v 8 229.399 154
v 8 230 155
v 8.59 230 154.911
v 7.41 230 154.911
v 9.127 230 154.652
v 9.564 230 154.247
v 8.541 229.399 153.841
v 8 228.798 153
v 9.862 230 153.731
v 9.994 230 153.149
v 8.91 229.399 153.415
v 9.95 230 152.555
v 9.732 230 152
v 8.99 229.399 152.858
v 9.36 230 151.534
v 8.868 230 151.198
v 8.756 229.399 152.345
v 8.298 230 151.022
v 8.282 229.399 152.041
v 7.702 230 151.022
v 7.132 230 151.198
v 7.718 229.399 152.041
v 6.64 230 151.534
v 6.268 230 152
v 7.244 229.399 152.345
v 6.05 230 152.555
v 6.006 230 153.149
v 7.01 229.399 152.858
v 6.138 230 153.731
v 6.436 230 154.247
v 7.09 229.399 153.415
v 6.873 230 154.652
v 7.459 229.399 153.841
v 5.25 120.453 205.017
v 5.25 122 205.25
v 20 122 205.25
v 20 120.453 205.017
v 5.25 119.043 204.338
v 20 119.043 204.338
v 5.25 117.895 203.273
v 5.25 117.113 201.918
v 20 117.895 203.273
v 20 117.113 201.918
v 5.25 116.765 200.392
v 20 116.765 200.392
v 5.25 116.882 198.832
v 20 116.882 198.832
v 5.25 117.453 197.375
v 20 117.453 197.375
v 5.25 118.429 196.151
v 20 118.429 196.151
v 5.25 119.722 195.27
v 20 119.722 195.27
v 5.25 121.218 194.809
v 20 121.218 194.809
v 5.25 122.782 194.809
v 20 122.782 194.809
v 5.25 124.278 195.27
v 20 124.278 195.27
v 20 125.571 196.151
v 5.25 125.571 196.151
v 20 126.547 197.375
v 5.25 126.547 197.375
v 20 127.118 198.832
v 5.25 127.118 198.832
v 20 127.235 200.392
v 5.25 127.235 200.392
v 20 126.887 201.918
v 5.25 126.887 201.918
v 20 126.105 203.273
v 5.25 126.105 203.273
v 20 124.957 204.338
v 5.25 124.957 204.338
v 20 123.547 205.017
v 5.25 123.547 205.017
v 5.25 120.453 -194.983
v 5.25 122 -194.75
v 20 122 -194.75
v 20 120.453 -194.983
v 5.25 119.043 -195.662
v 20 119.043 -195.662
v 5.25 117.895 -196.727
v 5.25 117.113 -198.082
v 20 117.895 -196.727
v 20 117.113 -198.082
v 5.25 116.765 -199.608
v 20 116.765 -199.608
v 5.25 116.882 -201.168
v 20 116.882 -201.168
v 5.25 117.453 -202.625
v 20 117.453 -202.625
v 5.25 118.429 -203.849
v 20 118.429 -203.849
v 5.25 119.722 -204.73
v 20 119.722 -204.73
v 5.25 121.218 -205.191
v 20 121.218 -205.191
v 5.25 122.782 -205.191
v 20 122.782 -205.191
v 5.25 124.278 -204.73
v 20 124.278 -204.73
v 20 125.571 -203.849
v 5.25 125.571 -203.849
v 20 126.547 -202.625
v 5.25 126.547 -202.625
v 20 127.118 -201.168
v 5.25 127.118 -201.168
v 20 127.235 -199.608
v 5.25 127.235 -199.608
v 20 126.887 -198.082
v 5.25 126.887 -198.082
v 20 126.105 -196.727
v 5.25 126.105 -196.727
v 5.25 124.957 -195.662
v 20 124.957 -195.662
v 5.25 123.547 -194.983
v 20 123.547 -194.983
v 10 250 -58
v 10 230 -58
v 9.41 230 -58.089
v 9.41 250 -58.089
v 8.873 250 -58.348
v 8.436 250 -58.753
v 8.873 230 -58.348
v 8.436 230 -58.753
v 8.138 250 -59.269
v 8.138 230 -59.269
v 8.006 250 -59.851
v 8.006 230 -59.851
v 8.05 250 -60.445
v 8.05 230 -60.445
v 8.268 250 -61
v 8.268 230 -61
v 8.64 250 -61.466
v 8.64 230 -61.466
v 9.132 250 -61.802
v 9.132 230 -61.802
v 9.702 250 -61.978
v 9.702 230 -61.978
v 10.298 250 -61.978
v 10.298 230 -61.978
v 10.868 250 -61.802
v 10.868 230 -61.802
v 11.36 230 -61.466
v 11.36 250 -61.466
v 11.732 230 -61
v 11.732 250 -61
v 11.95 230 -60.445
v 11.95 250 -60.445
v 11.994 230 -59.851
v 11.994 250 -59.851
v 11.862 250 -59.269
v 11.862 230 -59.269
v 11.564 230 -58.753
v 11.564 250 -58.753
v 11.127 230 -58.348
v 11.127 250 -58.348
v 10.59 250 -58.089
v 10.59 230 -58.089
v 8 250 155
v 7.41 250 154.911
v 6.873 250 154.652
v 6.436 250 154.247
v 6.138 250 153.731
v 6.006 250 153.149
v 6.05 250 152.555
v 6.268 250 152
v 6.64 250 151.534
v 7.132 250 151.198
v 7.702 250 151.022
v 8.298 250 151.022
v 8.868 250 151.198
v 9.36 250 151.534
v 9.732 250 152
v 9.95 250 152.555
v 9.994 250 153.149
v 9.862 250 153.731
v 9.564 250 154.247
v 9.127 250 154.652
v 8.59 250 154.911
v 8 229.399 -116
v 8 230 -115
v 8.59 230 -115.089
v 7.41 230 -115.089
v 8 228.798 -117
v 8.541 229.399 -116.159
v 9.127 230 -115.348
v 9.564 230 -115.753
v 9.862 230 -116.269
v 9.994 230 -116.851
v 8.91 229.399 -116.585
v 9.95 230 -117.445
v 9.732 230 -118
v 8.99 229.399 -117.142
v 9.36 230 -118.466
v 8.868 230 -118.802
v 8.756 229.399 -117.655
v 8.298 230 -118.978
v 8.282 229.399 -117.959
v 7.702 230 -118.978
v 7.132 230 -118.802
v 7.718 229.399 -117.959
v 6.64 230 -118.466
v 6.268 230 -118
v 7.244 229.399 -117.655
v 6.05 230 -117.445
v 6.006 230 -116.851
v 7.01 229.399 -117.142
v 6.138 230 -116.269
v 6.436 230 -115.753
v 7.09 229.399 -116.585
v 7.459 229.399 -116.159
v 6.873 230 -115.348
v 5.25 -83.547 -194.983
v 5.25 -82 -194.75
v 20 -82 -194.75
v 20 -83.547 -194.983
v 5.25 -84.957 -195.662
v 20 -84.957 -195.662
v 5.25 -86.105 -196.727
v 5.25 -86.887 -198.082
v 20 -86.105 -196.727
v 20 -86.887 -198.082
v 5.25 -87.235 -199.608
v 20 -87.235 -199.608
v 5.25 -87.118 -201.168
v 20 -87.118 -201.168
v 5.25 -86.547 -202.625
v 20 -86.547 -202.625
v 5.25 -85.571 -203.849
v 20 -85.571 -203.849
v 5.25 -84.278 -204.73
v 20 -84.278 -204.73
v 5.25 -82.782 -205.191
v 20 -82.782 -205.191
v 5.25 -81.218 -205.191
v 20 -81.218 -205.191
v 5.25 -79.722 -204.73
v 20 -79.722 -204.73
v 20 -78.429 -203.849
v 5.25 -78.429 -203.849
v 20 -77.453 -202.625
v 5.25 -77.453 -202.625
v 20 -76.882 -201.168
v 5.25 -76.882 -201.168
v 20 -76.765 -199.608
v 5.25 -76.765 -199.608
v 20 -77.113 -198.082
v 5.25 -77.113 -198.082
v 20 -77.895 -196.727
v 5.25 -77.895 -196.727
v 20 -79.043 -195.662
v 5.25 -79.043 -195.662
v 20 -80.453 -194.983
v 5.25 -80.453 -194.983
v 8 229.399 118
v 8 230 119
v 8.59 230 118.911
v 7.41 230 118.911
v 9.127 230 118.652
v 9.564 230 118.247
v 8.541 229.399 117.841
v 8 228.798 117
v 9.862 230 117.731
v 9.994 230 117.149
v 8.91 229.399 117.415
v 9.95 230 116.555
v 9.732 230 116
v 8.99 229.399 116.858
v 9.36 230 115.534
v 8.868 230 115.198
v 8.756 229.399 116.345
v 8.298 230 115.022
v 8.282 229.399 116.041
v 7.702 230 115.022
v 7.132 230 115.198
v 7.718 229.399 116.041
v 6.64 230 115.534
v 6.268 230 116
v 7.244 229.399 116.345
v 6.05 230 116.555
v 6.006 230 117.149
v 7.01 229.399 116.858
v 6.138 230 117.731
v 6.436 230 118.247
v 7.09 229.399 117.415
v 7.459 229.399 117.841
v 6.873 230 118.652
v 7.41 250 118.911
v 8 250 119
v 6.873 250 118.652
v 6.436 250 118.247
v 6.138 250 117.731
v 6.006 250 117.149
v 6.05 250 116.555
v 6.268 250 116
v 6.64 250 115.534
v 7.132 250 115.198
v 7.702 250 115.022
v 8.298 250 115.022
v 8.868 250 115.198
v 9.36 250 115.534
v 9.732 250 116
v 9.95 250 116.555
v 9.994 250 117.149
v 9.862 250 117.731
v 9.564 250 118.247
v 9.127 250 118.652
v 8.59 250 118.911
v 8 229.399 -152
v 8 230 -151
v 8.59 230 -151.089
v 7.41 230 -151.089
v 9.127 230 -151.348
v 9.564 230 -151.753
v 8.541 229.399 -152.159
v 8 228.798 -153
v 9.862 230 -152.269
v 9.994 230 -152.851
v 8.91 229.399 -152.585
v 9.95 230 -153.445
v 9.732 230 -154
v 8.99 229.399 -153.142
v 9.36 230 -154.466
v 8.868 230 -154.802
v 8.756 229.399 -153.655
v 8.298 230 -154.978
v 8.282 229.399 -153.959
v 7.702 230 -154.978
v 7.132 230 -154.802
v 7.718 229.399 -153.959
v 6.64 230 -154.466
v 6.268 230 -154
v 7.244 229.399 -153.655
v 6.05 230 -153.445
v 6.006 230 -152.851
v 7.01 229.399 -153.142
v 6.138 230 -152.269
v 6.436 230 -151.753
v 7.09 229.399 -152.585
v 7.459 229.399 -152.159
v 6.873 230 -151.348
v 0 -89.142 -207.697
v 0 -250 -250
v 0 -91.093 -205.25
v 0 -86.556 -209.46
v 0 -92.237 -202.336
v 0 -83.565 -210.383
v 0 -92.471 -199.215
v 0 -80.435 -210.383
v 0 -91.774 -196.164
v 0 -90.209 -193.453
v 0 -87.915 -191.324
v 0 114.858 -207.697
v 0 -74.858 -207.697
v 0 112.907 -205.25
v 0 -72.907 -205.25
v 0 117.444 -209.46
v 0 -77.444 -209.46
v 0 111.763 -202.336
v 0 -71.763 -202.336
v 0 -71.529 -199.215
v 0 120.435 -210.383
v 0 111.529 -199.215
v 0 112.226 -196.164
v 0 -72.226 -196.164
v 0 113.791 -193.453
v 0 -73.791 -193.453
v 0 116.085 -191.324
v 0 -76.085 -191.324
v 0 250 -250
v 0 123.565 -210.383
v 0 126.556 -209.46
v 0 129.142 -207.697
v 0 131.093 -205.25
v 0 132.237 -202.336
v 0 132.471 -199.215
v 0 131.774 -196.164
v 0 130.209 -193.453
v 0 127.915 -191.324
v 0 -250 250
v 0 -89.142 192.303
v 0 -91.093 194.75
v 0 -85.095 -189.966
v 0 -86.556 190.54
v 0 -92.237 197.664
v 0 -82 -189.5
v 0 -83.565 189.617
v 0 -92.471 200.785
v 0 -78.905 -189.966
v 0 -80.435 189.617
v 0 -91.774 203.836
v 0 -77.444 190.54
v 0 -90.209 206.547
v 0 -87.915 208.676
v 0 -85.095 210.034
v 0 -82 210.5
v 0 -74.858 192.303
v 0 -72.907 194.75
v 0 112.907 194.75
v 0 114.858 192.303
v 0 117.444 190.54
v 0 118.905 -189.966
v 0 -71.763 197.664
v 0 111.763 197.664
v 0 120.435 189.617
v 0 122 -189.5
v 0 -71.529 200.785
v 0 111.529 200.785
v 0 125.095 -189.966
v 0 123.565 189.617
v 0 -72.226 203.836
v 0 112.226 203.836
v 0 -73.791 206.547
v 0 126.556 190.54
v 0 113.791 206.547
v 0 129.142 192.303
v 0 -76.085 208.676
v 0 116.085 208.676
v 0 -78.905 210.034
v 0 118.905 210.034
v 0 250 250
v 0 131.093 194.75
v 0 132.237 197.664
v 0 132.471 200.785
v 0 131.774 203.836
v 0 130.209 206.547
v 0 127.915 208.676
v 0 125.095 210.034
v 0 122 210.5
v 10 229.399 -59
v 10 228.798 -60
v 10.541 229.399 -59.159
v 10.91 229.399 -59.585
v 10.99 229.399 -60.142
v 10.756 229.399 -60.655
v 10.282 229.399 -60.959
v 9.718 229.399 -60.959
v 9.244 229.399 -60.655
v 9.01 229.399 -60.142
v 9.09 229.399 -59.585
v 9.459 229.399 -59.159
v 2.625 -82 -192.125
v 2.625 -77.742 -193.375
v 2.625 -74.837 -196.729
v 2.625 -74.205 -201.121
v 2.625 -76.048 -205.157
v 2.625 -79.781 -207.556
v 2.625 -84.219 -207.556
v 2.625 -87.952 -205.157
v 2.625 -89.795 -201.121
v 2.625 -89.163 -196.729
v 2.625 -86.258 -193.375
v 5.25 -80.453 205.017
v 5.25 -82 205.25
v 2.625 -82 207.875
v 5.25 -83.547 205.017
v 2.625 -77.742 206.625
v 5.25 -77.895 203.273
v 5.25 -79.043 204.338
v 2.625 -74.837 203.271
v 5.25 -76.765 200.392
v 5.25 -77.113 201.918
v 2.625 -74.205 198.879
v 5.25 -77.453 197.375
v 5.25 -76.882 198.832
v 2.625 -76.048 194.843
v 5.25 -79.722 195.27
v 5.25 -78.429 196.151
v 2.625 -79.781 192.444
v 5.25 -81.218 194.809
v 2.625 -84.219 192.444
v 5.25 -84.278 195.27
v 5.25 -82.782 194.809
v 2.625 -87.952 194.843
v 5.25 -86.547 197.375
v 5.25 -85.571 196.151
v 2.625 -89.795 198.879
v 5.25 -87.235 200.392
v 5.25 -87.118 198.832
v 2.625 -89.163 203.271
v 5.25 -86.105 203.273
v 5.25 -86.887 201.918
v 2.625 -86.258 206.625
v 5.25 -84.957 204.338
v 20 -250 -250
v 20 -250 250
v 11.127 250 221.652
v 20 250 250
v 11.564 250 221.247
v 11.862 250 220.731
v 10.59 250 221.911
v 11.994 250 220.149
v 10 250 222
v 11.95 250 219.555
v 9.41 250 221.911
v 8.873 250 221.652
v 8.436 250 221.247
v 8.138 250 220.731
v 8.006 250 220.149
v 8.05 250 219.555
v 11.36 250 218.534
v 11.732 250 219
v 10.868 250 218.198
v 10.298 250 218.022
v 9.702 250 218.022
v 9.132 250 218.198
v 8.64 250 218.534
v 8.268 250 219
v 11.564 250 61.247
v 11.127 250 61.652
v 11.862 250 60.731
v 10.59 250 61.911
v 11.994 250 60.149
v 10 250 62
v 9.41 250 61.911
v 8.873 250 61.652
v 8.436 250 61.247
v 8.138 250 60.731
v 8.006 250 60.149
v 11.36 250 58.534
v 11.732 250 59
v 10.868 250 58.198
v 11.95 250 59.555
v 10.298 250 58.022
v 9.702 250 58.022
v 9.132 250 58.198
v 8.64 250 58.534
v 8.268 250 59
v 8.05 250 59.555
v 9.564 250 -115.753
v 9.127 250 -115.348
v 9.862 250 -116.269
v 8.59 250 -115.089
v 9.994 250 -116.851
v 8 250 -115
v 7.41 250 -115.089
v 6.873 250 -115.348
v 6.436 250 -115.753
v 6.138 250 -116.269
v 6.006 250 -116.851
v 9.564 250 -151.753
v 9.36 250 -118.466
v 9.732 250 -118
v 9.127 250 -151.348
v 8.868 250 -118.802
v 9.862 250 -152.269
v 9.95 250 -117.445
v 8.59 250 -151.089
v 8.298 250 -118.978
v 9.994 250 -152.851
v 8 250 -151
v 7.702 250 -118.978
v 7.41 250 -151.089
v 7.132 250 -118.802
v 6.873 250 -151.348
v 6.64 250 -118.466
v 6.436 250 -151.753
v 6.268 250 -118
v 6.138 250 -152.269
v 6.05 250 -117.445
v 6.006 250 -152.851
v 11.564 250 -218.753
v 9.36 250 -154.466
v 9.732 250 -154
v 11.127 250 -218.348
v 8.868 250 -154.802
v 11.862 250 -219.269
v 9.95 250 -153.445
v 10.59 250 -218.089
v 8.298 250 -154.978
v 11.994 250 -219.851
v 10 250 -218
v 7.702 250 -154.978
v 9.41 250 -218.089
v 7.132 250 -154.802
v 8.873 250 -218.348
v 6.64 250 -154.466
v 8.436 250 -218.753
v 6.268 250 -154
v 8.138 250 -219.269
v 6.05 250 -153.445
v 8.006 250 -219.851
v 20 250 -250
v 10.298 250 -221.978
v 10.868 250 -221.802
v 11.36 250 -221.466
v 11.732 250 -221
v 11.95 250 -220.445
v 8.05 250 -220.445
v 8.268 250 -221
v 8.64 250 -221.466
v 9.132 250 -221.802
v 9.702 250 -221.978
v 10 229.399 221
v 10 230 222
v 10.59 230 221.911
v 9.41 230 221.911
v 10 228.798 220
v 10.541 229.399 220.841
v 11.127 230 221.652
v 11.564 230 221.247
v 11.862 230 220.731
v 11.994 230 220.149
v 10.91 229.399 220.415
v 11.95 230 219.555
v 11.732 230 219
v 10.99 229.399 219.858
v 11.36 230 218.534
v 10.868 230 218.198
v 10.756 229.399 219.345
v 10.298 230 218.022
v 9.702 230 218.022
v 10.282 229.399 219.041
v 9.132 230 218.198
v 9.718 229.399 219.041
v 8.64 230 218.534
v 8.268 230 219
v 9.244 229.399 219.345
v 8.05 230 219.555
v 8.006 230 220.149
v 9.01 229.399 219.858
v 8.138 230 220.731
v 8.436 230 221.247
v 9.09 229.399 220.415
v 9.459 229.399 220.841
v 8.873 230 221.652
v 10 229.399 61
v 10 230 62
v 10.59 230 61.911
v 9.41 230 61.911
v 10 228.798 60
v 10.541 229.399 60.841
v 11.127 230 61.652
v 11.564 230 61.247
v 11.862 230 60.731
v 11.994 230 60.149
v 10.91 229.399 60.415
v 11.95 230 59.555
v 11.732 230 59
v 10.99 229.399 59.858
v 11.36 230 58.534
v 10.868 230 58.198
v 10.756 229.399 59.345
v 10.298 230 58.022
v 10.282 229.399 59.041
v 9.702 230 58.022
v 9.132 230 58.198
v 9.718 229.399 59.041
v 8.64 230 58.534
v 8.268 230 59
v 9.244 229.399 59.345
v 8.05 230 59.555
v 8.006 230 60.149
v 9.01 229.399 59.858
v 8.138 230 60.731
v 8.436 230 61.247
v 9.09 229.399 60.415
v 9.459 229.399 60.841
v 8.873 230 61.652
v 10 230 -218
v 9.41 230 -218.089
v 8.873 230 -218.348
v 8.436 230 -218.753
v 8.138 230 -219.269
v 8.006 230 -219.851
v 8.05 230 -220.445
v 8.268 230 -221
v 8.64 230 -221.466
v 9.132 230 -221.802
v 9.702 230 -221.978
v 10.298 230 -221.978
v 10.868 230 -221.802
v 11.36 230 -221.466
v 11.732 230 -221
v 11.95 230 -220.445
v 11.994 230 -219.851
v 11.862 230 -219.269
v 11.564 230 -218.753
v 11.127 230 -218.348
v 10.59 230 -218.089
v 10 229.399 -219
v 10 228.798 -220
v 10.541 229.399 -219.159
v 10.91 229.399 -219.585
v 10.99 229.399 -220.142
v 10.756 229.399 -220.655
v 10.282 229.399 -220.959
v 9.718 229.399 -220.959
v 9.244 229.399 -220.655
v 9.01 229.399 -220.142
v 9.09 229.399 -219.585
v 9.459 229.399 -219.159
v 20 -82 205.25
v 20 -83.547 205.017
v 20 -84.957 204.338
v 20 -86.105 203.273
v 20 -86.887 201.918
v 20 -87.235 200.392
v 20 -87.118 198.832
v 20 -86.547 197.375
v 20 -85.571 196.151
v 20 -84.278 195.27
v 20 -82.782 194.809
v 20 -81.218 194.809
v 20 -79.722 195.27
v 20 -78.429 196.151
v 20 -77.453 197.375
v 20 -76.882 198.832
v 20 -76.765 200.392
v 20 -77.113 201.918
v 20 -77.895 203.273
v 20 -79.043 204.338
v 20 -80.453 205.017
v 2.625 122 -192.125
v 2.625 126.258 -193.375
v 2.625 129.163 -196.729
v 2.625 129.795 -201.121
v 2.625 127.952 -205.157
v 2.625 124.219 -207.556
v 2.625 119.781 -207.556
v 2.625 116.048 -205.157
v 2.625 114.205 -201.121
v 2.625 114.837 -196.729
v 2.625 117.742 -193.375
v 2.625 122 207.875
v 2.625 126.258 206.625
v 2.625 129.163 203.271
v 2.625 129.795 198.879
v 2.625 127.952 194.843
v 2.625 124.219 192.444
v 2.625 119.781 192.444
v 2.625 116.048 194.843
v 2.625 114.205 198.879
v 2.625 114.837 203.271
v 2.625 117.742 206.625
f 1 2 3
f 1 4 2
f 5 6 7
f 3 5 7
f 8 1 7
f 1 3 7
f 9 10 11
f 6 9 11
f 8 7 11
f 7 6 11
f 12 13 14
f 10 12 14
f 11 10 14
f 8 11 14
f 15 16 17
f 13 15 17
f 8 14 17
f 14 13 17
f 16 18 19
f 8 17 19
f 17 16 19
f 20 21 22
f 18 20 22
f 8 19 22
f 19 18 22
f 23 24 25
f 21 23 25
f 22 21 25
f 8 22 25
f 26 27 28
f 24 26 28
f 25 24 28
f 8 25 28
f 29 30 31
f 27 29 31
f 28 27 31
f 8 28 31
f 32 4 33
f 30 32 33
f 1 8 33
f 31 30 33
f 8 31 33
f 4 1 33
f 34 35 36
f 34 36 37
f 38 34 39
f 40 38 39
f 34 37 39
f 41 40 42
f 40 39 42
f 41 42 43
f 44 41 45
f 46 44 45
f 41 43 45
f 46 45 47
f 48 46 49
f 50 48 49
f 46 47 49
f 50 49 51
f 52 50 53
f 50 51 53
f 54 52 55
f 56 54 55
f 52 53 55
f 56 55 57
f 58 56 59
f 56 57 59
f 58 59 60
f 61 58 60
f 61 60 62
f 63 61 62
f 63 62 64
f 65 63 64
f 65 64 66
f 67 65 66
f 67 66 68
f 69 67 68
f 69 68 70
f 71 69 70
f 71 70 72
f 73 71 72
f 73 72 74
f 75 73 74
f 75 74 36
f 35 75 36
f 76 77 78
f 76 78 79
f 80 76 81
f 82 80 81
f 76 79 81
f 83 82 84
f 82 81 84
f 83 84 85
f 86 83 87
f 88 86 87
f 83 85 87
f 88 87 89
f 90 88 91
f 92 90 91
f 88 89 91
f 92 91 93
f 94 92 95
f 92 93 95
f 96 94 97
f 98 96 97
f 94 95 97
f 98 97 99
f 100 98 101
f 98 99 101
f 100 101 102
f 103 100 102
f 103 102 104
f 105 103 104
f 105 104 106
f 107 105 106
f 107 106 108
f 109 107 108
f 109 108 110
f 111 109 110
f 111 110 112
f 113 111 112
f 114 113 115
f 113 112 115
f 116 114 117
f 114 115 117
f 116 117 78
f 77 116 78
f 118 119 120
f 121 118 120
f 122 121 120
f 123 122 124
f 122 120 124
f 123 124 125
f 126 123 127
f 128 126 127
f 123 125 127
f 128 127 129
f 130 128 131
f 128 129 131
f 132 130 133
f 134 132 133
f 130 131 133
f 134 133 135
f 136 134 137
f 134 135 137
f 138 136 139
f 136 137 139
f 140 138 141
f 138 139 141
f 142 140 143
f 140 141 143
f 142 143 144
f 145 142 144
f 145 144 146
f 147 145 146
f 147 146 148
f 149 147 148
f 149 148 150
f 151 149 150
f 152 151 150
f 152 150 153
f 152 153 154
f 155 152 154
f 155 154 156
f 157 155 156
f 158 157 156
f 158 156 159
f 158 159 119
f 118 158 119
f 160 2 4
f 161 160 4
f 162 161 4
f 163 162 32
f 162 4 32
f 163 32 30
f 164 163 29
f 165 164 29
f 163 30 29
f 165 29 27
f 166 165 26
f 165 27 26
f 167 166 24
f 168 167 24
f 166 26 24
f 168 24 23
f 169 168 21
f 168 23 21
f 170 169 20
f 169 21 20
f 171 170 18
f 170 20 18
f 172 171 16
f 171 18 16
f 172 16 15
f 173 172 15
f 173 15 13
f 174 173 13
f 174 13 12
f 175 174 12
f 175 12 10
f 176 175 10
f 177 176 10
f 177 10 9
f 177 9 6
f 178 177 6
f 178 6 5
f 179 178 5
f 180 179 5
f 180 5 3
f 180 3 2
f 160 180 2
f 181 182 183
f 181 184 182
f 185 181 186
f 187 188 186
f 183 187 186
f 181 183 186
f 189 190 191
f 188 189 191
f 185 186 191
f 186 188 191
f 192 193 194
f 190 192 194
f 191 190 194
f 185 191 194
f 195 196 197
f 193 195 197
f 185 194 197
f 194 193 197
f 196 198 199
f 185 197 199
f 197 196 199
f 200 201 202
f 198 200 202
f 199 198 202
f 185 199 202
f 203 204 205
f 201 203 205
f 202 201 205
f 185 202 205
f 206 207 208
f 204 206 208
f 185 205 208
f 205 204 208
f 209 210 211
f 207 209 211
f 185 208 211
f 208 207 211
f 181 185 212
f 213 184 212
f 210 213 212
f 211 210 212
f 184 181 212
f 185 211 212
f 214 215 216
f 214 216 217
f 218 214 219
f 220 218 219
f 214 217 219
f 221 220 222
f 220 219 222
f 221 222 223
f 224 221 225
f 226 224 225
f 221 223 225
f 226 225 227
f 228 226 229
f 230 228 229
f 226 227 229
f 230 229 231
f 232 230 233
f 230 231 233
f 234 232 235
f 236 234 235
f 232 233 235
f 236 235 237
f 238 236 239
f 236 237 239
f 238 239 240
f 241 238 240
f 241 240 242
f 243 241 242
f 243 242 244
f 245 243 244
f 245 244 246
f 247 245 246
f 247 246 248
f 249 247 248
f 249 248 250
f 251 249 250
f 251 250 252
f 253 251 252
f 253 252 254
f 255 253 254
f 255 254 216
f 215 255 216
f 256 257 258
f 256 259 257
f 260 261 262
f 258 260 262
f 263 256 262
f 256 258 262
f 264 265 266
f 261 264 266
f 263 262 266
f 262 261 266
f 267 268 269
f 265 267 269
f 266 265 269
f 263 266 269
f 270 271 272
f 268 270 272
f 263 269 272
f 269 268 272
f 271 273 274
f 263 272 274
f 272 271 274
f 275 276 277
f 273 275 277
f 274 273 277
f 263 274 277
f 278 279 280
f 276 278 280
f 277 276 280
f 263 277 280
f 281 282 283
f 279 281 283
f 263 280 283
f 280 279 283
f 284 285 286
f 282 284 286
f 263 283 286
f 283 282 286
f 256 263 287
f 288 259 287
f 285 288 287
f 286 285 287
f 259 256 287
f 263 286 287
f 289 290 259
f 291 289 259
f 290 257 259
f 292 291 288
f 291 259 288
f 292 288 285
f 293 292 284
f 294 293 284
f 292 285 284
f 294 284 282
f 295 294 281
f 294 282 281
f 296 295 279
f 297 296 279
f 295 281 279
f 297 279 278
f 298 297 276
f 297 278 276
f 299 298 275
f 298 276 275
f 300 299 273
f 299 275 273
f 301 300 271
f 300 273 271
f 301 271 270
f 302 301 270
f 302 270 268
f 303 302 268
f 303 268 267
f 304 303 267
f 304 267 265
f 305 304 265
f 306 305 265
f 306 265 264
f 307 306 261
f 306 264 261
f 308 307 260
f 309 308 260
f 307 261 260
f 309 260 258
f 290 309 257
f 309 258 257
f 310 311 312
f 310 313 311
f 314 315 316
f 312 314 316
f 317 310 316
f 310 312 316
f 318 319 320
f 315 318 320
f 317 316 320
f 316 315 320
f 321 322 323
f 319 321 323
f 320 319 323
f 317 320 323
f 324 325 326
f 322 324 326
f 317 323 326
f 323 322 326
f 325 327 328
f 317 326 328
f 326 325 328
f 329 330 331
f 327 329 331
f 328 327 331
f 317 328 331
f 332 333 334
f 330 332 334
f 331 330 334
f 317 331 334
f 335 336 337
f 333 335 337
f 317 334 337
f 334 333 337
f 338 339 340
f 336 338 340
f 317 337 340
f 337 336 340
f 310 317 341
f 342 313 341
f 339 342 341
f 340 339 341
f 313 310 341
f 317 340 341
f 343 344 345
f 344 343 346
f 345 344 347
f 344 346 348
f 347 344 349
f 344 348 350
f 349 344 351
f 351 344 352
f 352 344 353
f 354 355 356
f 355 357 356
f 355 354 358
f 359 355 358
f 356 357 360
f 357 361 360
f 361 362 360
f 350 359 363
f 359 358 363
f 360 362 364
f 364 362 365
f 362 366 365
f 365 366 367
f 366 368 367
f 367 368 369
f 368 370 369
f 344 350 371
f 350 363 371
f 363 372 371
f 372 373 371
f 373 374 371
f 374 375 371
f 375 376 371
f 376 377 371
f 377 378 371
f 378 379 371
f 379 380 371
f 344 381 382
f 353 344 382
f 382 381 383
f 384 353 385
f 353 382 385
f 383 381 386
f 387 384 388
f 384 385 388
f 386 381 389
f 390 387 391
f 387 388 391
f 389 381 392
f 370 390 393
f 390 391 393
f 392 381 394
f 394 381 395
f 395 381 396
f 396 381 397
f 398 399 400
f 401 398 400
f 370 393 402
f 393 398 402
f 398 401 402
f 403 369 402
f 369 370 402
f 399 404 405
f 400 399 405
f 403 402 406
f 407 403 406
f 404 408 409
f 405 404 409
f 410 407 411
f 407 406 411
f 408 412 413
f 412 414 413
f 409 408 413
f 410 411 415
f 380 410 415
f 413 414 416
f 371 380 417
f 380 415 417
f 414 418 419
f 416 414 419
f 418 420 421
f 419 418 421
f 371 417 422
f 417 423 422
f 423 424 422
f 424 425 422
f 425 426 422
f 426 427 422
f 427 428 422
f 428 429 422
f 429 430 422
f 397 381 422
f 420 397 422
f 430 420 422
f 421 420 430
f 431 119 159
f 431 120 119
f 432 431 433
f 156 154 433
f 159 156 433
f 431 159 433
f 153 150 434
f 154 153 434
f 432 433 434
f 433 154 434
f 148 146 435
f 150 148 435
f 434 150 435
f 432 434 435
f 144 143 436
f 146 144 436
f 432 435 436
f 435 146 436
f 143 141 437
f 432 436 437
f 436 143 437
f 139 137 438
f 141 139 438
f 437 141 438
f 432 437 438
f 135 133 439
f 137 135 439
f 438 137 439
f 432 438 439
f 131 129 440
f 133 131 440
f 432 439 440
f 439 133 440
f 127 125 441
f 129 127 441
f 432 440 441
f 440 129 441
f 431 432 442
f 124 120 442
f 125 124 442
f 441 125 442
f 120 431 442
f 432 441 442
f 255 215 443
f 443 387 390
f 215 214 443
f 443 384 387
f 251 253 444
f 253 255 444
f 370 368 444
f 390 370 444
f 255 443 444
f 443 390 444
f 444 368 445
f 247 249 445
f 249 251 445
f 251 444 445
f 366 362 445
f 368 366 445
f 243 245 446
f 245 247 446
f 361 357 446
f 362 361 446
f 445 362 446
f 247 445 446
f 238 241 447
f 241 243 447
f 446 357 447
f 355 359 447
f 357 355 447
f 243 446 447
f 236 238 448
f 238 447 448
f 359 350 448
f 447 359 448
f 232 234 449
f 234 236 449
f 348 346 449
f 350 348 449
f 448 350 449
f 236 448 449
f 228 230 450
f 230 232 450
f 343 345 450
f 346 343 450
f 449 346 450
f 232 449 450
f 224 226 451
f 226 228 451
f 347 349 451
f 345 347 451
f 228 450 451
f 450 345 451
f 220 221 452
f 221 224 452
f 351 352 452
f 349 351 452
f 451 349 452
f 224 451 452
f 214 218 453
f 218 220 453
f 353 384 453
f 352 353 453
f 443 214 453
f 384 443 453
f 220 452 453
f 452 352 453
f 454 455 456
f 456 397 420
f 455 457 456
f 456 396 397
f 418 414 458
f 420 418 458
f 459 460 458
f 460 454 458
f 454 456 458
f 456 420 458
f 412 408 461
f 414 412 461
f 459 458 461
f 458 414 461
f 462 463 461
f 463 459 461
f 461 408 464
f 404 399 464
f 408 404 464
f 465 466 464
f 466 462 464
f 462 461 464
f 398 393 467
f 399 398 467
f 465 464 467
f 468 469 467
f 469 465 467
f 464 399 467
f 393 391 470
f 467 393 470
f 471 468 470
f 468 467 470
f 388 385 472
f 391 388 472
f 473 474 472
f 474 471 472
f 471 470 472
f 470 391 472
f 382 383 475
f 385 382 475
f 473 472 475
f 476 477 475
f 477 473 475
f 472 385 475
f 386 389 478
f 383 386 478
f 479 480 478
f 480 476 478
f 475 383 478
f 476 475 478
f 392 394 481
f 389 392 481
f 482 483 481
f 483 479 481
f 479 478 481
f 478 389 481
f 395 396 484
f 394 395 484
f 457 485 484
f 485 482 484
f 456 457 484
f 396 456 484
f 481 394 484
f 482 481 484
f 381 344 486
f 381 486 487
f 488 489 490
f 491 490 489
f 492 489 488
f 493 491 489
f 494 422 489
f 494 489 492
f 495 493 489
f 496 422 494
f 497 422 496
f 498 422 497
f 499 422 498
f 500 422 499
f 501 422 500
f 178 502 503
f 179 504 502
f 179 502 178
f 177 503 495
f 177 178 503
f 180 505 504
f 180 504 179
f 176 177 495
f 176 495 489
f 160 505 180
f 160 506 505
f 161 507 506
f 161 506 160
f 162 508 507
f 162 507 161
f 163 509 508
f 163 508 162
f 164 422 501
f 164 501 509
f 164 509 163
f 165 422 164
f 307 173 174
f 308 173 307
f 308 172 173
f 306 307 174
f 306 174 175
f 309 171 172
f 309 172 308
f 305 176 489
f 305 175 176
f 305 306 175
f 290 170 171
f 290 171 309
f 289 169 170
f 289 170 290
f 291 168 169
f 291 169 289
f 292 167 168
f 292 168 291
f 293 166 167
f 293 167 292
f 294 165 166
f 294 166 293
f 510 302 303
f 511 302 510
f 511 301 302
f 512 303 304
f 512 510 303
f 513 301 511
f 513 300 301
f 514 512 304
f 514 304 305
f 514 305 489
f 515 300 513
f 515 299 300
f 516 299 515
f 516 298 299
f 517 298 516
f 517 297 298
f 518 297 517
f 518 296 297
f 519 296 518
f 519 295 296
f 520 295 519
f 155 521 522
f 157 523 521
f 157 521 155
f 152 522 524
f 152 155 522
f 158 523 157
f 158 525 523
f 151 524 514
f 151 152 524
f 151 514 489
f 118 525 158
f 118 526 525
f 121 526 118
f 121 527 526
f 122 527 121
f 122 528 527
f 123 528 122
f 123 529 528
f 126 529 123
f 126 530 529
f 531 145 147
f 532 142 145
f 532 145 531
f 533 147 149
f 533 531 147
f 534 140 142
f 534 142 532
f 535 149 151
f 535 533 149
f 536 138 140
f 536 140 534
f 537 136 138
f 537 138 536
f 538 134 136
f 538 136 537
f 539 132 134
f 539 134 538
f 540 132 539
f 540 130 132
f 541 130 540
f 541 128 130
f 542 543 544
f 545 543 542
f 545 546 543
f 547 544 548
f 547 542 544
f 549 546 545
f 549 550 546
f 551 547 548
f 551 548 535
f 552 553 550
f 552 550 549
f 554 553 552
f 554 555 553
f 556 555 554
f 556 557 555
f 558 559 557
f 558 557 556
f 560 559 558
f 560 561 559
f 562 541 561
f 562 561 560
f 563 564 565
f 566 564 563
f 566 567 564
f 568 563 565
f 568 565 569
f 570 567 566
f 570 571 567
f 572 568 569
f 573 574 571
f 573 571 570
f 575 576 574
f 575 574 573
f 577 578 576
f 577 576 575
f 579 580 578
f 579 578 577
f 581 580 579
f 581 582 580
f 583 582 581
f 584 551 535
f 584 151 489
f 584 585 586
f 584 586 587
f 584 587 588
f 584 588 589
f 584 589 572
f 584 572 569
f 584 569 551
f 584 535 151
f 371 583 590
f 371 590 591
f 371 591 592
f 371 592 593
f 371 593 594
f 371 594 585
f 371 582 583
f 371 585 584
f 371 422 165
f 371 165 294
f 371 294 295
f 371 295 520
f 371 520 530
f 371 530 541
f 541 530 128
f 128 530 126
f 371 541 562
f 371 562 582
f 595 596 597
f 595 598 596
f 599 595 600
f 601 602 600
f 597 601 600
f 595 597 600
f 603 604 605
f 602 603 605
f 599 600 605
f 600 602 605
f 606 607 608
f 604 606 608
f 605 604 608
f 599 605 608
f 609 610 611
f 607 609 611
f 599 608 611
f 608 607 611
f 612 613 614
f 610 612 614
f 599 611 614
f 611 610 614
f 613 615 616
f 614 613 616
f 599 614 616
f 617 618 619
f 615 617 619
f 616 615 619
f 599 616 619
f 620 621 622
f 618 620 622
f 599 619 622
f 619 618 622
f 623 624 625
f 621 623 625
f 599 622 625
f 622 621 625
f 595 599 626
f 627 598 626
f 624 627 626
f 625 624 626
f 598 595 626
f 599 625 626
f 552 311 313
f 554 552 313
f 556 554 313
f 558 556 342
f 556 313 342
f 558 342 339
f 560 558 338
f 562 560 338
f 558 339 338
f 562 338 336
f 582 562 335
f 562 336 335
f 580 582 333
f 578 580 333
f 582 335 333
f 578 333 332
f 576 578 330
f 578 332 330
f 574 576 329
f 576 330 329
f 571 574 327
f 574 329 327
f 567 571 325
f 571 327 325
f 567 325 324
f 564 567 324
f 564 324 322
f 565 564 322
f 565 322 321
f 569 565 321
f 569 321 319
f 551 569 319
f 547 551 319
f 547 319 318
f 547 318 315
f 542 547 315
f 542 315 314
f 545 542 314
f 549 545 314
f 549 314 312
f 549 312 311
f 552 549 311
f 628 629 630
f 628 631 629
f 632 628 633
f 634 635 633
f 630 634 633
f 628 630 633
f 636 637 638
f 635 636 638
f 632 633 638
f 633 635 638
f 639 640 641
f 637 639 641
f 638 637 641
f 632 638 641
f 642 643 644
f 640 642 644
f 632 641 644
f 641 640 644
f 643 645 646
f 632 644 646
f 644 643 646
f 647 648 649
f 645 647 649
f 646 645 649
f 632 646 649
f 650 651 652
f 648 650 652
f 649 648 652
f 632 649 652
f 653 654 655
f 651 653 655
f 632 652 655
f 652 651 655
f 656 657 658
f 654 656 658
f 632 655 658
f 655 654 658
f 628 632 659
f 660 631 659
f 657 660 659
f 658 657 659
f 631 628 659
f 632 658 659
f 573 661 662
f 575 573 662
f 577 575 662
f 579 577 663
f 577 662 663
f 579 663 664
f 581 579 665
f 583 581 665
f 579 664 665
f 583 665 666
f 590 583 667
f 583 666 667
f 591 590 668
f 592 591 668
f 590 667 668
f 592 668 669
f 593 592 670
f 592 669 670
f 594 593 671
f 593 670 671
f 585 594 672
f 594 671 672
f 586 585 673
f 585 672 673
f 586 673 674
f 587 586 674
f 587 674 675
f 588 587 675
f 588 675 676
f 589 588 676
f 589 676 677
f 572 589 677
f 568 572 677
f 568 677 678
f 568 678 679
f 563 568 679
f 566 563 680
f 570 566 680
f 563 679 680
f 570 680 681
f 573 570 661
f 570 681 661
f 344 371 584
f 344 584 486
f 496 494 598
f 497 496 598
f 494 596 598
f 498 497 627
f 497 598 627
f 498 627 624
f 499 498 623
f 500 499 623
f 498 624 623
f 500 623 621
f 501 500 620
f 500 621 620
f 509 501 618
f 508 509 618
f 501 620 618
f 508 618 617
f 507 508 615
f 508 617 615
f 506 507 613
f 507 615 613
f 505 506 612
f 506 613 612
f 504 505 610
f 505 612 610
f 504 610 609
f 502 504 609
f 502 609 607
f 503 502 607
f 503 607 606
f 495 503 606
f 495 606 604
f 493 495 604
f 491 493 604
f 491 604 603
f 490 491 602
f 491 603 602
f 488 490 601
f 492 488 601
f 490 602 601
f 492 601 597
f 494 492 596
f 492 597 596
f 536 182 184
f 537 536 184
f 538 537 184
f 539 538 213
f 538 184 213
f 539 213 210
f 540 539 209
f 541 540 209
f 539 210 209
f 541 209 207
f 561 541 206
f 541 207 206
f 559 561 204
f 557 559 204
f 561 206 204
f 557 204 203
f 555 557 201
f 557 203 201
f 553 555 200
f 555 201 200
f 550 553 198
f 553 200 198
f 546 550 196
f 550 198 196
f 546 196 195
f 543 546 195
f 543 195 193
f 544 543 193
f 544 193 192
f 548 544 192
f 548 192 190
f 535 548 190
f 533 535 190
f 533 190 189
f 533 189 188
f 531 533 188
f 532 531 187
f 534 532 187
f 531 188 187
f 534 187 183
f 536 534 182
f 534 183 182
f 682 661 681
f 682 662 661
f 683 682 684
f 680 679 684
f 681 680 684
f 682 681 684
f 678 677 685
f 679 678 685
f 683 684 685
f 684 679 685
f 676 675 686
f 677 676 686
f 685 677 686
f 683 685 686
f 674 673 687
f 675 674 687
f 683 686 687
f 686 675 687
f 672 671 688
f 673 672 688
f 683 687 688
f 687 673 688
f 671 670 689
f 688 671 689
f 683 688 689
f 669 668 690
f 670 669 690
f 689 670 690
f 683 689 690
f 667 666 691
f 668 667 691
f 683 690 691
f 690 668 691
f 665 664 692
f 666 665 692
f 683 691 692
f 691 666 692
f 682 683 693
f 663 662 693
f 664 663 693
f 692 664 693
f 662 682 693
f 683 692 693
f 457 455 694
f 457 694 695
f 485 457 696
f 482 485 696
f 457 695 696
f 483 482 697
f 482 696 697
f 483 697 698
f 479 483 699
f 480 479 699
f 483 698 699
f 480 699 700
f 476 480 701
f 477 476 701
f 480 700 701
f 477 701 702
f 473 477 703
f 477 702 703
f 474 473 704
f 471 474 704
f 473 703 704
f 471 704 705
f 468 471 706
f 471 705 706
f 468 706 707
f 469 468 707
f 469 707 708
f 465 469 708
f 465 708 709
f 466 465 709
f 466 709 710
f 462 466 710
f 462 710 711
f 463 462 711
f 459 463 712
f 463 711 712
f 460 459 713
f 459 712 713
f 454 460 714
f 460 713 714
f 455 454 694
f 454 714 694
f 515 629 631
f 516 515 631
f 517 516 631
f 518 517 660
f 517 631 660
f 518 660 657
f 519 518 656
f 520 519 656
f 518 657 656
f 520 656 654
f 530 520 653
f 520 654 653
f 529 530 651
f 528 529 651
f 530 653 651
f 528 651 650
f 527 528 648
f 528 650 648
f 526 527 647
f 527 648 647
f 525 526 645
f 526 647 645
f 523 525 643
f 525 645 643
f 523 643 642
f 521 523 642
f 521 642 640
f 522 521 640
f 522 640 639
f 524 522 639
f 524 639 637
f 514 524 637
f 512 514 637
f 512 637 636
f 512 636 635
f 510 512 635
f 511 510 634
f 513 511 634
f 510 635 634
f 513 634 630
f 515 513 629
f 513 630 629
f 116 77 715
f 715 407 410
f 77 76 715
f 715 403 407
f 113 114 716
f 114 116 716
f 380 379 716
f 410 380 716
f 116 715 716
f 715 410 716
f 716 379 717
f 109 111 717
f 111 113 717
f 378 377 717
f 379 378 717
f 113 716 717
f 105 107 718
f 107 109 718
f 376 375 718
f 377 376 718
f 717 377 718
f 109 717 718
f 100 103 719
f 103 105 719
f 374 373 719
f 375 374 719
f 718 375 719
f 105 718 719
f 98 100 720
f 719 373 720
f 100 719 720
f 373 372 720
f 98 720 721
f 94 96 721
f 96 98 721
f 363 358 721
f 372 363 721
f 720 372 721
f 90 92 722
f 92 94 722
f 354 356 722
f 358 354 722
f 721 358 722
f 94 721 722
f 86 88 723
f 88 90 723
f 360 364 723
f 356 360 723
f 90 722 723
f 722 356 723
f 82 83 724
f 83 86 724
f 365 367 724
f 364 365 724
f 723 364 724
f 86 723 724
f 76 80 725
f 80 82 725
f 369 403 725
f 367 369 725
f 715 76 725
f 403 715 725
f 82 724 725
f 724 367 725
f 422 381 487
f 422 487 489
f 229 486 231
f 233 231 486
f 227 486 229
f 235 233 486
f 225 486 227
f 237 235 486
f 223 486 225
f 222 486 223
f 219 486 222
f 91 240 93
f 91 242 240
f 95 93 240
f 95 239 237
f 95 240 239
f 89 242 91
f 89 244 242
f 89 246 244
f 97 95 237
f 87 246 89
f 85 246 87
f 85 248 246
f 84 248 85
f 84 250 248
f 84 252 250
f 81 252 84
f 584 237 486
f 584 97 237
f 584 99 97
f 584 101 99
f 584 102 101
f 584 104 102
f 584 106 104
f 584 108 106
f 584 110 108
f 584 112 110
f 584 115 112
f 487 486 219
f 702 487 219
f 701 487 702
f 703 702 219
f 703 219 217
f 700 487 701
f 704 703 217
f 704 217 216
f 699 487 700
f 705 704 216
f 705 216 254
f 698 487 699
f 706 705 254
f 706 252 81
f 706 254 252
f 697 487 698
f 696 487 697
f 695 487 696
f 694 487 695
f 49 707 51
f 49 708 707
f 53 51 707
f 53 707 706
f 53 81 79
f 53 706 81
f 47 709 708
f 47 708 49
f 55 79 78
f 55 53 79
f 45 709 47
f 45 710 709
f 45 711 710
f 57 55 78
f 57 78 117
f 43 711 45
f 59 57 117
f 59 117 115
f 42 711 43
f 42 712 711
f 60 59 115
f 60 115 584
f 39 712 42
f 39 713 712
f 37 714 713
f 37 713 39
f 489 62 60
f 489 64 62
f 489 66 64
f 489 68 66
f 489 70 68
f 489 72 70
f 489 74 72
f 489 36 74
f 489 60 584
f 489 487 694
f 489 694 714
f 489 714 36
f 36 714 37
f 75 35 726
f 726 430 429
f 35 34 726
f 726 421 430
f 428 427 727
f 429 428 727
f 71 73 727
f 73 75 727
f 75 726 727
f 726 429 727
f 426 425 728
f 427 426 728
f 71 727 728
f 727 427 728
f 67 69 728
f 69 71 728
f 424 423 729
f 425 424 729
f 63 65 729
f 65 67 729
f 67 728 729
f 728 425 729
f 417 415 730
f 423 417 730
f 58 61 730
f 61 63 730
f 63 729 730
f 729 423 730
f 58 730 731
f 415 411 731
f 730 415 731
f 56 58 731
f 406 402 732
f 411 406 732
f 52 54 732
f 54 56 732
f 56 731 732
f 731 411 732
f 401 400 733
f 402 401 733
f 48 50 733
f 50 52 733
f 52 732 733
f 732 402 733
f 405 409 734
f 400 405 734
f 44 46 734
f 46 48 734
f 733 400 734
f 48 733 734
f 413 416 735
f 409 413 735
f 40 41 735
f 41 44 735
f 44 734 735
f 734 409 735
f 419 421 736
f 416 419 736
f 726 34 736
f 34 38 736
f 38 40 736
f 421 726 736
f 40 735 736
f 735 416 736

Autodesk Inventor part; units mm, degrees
ref_plane "YZ Plane" through (0, 0, 0) normal (1, 0, 0) x (0, 1, 0)
ref_plane "XZ Plane" through (0, 0, 0) normal (0, 1, 0) x (-1, 0, 0)
ref_plane "XY Plane" through (0, 0, 0) normal (0, 0, 1) x (1, 0, 0)
sketch "Skizze1" plane through (0, 0, 0) normal (1, 0, 0) x (0, 1, 0)
  line L0 (-250, 250) -> (250, 250)
  line L1 (250, 250) -> (250, -250)
  line L2 (250, -250) -> (-250, -250)
  line L3 (-250, -250) -> (-250, 250)
  line L4 (-250, 250) -> (250, -250) construction
  line L5 (250, 250) -> (-250, -250) construction
  point P0 (0, 0)
  dimension "d0" = 500
  dimension "d1" = 500
extrude "Extrusion1" add sketch "Skizze1" along normal blind 20
sketch "Skizze2" plane through (0, 0, 0) normal (-1, 0, 0) x (0, 0, 1)
  line L0 (0, 0) -> (0, -82)
  line L1 (0, -82) -> (200, -82)
  line L2 (200, -82) -> (-200, -82)
  line L3 (-200, -82) -> (-200, 122)
  line L4 (-200, 122) -> (200, 122)
  dimension "d4" = 82
  dimension "d5" = 200
  dimension "d71" = 204
  dimension "d72" = 400
hole "Bohrung1" at (0, -82, 200) at (0, -82, -200) at (0, 122, 200) at (0, 122, -200) direction (1, 0, 0) diameter 10.5 end through all countersink diameter 21 countersink angle 90
sketch "Skizze4" plane through (0, 250, 250) normal (0, 1, 0) x (1, 0, 0)
  line L0 (0, 0) -> (20, 0) projected
  line L1 (0, 0) -> (0, 85)
  line L2 (0, 500) -> (0, 0) projected
  line L3 (20, 0) -> (8, 0)
  line L4 (8, 0) -> (8, 85)
  line L5 (8, 85) -> (8, 97)
  line L6 (8, 97) -> (8, 133)
  line L7 (20, 500) -> (20, 0) projected
  line L8 (20, 500) -> (8, 500)
  line L9 (0, 500) -> (20, 500) projected
  line L10 (8, 500) -> (8, 415)
  line L11 (8, 415) -> (8, 403)
  line L12 (8, 403) -> (8, 367)
  point P0 (0, 250)
  dimension "d40" = 12
  dimension "d41" = 85
  dimension "d42" = 12
  dimension "d43" = 36
  dimension "d44" = 12
  dimension "d45" = 85
  dimension "d46" = 12
  dimension "d47" = 36
hole "Bohrung2" at (8, 250, 153) at (8, 250, 117) at (8, 250, -117) at (8, 250, -153) direction (0, -1, 0) diameter 4 depth 20 tip angle 118
sketch "Skizze5" plane through (0, 250, 250) normal (0, 1, 0) x (1, 0, 0)
  line L0 (0, 0) -> (0, 500) projected
  line L1 (0, 0) -> (10, 0)
  line L2 (0, 0) -> (20, 0) projected
  line L3 (10, 0) -> (10, 30)
  line L4 (10, 0) -> (10, 190)
  line L5 (0, 500) -> (10, 500)
  line L6 (0, 500) -> (20, 500) projected
  line L7 (10, 500) -> (-20, 500)
  line L8 (10, 500) -> (10, 470)
  line L9 (10, 500) -> (10, 310)
  point P0 (0, 250)
  dimension "d55" = 10
  dimension "d56" = 30
  dimension "d57" = 190
  dimension "d58" = 10
  dimension "d59" = 30
  dimension "d60" = 30
  dimension "d61" = 190
hole "Bohrung3" at (10, 250, 220) at (10, 250, 60) at (10, 250, -60) at (10, 250, -220) direction (0, -1, 0) diameter 4 depth 20 tip angle 118
properties part number "Sitzplatte" material "Holz (Birke)"
